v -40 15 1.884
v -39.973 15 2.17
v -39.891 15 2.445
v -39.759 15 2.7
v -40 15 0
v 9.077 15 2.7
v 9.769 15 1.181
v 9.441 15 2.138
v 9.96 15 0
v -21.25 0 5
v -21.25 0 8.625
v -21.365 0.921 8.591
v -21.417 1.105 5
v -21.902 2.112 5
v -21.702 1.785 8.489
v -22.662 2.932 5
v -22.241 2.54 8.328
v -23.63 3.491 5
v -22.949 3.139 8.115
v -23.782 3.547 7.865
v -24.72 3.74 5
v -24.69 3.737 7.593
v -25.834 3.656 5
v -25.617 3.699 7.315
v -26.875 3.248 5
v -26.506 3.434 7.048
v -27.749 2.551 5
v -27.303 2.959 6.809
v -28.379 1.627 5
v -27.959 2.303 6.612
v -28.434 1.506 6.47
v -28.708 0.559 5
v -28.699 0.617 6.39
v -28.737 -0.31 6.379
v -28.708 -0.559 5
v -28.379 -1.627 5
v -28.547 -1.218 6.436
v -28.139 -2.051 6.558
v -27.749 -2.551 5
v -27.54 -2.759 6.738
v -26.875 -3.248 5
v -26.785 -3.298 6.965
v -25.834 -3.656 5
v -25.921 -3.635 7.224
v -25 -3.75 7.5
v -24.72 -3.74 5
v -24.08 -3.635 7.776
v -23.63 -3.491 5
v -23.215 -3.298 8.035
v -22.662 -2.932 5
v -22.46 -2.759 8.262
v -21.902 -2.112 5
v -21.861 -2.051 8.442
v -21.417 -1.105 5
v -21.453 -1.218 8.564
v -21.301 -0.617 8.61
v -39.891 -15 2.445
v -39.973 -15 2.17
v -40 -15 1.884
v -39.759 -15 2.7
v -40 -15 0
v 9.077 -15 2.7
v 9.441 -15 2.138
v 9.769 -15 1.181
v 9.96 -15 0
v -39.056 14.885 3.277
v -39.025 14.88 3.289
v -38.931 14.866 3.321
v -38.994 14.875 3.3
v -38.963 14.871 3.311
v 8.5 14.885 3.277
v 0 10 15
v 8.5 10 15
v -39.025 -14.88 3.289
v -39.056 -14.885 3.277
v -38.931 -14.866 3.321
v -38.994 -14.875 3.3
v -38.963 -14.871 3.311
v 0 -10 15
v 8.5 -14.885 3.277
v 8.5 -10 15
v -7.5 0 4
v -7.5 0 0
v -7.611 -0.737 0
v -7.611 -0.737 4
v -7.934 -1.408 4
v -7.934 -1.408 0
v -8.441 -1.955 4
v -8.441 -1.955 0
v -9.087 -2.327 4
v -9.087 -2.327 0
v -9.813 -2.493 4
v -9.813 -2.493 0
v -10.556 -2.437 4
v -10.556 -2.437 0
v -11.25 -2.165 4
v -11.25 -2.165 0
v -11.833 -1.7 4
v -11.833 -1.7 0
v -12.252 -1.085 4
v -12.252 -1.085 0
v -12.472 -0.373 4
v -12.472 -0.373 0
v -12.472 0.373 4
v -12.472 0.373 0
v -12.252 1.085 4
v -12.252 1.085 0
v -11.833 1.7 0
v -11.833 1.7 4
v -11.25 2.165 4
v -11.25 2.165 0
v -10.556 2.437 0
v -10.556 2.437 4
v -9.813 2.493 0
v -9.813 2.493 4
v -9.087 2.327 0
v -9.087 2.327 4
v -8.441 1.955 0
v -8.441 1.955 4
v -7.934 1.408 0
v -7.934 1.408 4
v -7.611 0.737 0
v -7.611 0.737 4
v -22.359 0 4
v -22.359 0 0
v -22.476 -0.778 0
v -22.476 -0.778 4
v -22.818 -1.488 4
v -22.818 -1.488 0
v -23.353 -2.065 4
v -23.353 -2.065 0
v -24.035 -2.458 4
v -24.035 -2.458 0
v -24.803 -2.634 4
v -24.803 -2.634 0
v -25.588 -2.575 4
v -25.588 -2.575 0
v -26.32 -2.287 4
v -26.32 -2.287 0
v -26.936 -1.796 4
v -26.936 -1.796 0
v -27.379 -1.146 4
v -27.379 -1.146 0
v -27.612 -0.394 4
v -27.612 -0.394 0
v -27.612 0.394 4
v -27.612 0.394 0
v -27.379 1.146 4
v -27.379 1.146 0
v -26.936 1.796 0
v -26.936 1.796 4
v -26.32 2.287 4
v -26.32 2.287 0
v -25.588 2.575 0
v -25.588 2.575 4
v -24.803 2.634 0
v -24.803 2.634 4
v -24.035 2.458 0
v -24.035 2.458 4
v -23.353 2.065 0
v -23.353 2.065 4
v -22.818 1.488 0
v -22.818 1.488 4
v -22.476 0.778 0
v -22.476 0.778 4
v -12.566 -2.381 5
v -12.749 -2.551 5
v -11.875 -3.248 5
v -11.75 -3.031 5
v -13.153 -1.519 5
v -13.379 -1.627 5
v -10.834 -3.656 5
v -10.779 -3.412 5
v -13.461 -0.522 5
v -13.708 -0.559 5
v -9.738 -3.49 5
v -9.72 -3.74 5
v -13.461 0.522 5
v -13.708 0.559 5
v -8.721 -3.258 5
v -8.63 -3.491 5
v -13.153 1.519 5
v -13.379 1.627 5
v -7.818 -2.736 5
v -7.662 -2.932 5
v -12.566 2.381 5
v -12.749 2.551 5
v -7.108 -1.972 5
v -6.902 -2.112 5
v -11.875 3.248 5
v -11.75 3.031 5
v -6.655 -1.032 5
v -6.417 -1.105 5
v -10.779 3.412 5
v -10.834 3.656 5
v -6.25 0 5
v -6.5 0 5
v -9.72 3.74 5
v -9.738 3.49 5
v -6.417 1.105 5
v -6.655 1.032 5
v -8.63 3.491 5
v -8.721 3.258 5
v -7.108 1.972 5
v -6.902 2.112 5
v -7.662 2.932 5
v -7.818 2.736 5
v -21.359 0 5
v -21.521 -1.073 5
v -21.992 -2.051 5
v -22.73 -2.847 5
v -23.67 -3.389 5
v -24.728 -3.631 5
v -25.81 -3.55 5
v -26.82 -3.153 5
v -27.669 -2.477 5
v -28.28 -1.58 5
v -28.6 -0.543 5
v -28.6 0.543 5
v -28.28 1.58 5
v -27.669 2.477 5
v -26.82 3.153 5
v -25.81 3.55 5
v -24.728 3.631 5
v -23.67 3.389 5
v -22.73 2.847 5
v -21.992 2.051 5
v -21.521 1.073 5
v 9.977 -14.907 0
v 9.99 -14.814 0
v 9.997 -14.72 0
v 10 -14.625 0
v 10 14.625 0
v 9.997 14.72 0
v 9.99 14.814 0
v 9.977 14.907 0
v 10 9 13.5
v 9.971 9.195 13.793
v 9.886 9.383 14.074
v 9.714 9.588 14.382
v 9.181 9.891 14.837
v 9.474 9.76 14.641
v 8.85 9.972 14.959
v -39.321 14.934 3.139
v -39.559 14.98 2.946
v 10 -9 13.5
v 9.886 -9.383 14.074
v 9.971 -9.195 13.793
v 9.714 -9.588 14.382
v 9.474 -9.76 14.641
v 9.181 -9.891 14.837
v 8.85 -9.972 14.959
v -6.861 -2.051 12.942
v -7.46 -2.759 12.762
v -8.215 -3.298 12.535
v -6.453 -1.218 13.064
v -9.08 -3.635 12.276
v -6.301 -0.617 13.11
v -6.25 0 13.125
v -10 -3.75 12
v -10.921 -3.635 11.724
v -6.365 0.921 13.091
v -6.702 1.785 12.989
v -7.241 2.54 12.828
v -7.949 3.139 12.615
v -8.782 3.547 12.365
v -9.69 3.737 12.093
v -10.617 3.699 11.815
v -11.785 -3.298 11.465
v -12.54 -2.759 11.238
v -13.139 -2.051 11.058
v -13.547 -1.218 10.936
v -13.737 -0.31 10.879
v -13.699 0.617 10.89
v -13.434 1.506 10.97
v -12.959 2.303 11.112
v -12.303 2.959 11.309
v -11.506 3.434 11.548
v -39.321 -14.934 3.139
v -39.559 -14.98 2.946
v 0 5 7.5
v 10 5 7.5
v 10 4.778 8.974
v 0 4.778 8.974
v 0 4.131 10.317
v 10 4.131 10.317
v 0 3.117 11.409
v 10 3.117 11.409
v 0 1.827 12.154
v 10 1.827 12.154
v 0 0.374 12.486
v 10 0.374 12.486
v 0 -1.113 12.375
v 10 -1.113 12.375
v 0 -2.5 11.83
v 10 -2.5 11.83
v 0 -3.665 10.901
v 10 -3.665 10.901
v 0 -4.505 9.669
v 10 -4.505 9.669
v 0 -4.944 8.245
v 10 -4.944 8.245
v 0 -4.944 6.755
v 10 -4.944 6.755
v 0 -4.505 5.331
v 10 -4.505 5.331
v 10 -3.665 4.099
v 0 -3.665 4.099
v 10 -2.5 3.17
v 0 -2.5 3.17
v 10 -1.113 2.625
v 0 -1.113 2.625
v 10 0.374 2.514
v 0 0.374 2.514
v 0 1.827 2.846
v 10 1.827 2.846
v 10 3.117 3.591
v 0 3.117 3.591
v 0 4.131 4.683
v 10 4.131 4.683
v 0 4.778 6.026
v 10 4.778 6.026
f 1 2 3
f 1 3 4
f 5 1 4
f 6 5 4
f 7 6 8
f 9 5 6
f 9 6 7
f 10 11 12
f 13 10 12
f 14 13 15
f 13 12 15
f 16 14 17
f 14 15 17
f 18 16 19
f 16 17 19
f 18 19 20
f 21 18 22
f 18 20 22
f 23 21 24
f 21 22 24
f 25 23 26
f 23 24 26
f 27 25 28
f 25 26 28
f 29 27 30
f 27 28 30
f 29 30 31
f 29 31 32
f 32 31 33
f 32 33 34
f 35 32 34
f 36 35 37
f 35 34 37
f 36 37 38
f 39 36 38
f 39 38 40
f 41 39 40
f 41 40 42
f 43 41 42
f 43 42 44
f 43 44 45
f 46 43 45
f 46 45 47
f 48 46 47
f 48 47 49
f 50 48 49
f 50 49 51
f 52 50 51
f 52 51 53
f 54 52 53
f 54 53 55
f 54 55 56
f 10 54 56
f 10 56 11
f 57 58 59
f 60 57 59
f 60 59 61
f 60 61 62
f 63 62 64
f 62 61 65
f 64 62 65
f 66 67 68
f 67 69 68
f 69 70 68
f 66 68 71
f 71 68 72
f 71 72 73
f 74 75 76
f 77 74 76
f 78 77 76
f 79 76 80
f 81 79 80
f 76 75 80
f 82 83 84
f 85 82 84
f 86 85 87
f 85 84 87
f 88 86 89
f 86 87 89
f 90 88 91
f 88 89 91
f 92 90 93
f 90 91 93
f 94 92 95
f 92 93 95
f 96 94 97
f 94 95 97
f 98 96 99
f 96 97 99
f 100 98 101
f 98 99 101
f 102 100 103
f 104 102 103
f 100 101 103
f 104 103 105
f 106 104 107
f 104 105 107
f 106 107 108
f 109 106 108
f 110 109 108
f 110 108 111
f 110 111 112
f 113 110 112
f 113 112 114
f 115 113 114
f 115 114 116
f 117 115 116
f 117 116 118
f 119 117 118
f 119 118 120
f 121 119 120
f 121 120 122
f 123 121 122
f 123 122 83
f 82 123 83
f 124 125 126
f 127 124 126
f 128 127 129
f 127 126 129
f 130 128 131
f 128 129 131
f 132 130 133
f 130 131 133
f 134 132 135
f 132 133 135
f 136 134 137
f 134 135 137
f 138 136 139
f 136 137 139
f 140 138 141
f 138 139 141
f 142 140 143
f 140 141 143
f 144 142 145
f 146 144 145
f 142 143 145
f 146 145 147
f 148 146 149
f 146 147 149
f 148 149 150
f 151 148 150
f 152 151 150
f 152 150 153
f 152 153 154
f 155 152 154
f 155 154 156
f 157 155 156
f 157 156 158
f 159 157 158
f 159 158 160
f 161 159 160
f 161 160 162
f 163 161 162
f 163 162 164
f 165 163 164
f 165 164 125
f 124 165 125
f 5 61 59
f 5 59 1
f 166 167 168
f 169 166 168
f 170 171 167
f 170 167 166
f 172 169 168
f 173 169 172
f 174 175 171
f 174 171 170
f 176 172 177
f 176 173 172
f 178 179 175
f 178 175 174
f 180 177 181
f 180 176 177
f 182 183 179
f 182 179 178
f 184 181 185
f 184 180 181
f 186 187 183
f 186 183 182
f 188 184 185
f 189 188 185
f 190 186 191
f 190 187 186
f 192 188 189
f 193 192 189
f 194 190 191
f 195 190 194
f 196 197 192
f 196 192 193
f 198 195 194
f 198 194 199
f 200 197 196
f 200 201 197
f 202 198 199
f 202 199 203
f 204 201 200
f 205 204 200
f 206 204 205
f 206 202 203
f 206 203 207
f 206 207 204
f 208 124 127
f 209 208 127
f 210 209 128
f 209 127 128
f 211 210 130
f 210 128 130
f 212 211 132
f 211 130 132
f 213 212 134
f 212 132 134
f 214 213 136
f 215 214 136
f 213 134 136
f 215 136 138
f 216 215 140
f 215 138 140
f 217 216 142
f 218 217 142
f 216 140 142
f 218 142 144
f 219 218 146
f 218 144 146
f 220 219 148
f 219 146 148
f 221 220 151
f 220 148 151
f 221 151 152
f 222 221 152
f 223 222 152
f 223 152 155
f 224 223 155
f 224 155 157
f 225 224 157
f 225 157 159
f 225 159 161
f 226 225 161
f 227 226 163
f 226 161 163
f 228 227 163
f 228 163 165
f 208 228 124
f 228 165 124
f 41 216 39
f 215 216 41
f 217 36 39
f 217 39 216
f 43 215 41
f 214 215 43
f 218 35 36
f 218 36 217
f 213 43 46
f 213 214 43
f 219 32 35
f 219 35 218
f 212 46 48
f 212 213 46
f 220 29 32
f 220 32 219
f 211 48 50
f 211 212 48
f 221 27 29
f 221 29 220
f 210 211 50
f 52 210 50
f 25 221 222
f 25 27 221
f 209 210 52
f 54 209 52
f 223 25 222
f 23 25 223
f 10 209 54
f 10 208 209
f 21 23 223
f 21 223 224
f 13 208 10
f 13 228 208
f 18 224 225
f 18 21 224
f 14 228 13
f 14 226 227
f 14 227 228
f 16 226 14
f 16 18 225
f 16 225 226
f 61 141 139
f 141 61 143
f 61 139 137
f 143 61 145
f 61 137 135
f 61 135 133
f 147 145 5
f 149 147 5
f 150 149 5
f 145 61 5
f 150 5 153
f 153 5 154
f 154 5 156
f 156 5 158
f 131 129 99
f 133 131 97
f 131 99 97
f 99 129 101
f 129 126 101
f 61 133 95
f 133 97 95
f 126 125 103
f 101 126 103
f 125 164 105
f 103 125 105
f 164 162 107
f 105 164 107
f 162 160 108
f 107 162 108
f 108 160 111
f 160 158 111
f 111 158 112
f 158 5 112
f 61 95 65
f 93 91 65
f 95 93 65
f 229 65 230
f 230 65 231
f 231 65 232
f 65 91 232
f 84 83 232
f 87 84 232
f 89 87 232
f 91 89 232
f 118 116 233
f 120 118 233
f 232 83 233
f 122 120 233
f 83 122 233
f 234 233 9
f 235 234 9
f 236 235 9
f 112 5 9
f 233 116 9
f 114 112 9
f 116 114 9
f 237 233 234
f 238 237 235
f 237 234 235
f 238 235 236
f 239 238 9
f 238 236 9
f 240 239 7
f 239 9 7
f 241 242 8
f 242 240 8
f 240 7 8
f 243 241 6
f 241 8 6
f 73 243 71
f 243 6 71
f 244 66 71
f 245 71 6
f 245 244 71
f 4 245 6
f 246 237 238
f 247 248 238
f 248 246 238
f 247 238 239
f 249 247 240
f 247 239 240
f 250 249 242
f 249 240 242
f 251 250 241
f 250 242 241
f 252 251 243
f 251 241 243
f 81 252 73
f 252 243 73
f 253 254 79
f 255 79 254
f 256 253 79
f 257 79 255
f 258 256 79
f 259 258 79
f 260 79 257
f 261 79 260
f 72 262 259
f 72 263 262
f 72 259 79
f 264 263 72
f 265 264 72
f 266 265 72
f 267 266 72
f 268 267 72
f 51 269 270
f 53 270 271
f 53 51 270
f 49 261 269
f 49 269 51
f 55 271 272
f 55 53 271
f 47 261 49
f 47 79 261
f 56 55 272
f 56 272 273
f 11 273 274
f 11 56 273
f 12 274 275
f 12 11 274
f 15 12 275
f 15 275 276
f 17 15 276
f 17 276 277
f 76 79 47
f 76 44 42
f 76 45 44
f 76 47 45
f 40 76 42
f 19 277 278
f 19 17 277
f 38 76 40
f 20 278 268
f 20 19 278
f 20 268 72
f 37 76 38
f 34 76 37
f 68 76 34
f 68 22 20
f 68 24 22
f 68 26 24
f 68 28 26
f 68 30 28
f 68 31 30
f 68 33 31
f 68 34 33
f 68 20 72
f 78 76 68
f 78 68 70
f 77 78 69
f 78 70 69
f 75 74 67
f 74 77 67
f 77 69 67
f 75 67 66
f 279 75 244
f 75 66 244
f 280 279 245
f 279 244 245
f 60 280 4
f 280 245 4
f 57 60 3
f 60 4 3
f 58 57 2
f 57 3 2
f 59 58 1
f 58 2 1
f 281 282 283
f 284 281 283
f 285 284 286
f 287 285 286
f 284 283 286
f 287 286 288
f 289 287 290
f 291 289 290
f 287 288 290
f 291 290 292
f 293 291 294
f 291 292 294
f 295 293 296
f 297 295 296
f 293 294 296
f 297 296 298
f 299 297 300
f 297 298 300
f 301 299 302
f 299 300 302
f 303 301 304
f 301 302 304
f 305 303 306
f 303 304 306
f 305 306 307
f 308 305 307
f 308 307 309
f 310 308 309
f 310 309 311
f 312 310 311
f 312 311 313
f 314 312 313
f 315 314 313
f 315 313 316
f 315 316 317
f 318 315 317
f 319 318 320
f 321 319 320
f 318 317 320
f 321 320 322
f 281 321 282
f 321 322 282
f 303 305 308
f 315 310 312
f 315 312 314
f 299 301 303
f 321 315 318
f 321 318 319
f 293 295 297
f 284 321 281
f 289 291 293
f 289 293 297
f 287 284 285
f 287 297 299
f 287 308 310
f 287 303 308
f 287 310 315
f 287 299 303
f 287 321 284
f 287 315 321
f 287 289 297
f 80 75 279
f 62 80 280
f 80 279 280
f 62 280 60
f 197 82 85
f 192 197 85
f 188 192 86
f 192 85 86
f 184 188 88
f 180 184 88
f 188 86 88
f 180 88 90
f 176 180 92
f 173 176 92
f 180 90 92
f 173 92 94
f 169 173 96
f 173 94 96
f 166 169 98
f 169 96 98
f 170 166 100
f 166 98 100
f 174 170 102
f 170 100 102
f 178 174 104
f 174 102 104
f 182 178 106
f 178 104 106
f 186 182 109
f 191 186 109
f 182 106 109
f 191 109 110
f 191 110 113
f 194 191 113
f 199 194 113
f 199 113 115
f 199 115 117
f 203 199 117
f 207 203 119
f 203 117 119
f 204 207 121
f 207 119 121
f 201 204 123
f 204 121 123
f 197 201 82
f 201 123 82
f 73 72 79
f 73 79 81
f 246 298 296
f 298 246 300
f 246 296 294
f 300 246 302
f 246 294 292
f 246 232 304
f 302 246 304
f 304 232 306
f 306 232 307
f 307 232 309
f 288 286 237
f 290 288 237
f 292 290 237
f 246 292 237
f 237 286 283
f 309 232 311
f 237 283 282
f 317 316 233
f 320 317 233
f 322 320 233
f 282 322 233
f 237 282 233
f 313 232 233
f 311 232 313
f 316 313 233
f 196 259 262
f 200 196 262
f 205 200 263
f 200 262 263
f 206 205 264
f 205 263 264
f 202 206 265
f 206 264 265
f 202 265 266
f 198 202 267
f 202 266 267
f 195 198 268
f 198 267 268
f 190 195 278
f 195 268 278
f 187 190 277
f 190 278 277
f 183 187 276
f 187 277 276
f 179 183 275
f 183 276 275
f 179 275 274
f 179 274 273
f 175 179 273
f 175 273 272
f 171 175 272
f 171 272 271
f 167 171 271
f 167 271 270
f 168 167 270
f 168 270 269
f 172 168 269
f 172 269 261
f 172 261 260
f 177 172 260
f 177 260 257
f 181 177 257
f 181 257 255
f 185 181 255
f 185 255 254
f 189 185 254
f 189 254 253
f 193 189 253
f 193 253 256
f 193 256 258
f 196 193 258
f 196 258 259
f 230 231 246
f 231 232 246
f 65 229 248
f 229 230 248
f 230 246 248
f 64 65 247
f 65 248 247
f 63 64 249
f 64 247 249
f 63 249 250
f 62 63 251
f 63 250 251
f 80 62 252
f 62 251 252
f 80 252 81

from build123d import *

# Parameters (mm, degrees)
F0_W        = 50
F0_H        = 30
F1_DEPTH    = 15
F2_SIZE2    = 12
F2_SIZE     = 40
F3_C1_SIZE2 = 5
F3_C1_SIZE  = 12
F3_C2_SIZE2 = 12
F3_C2_SIZE  = 5
F5_T1_DEPTH = 35.5802298817
F5_T3_DEPTH = 52.025
F5_T5_DEPTH = 27.5
F5_T7_DEPTH = 20.5
F5_T9_DEPTH = 20.5
F6_R        = 5
F7_DEPTH    = 10
F8_R        = 2.5
F8_R_2      = 2.6409986757
F9_DEPTH    = 40
F10_R       = 3.75
F11_DEPTH   = 10
F12_SIZE    = 1


# Not quite as in the source:
# - a fillet or chamfer that OpenCascade refuses, or shapes differently, is made with other operations: its cross-section is extruded or revolved along the edge and cut away or added
# - two fillets or chamfers of one size are made in one step


with BuildPart() as f1:
    # F0 (on Top) → F1 (new body)
    with BuildSketch(Plane.XY):
        with Locations((-15, 0)):
            Rectangle(F0_W, F0_H)
    extrude(amount=F1_DEPTH)

    # F2
    f2_edges = [f1.edges().sort_by_distance(p)[0] for p in [
        (-40, 0, 15),
    ]]
    f2_side = f1.faces().sort_by_distance((-15, 0, 15))[0]
    chamfer(f2_edges, length=F2_SIZE, length2=F2_SIZE2, reference=f2_side)

    # F3: chamfer of 12 x 5 on 2 edges, made by hand

    # F3_c1
    f3_c1_edges = [f1.edges().sort_by_distance(p)[0] for p in [
        (5, 15, 15),
    ]]
    f3_c1_side = f1.faces().sort_by_distance((5, 15, 14.9))[0]
    chamfer(f3_c1_edges, length=F3_C1_SIZE, length2=F3_C1_SIZE2, reference=f3_c1_side)

    # F3_c2
    f3_c2_edges = [f1.edges().sort_by_distance(p)[0] for p in [
        (5, -15, 15),
    ]]
    f3_c2_side = f1.faces().sort_by_distance((5, -14.9, 15))[0]
    chamfer(f3_c2_edges, length=F3_C2_SIZE, length2=F3_C2_SIZE2, reference=f3_c2_side)

    # F5: fillet of radius 1.5 on 6 edges, made by hand

    # F5_s2 → F5_t1 (cut)
    with BuildSketch(Plane.XZ.offset(-17.7901149408)):
        with BuildLine():
            ThreePointArc((-38.9310218283, 3.3206934515), (-39.7034393924, 2.7793498181), (-40, 1.8839540237))
            Line((-40, 1.8839540237), (-40, 3))
            Line((-40, 3), (-38.9310218283, 3.3206934515))
        make_face()
    extrude(amount=F5_T1_DEPTH, mode=Mode.SUBTRACT)

    # F5_s4 → F5_t3 (cut)
    with BuildSketch(Plane.YZ.offset(-41.275)):
        with BuildLine():
            ThreePointArc((14.8846153846, 3.2769230769), (14.9708710135, 2.9941742027), (15, 2.7))
            Line((15, 2.7), (15, 3))
            Line((15, 3), (14.8846153846, 3.2769230769))
        make_face()
        with BuildLine():
            ThreePointArc((-14.8846153846, 3.2769230769), (-14.9708710135, 2.9941742027), (-15, 2.7))
            Line((-15, 2.7), (-15, 3))
            Line((-15, 3), (-14.8846153846, 3.2769230769))
        make_face()
    extrude(amount=F5_T3_DEPTH, mode=Mode.SUBTRACT)

    # F5_s6 → F5_t5 (cut)
    with BuildSketch(Plane.XZ.offset(-13.75)):
        with BuildLine():
            ThreePointArc((10, 13.5), (9.5606601718, 14.5606601718), (8.5, 15))
            Line((8.5, 15), (10, 15))
            Line((10, 15), (10, 13.5))
        make_face()
    extrude(amount=F5_T5_DEPTH, mode=Mode.SUBTRACT)

    # F5_s8 → F5_t7 (cut)
    with BuildSketch(Plane(origin=(0, 2.5961538462, -6.2307692308), x_dir=(1, 0, 0), z_dir=(0, -0.3846153846, 0.9230769231))):
        with BuildLine():
            ThreePointArc((10, 13.5), (9.5606601718, 14.5606601718), (8.5, 15))
            Line((8.5, 15), (10, 15))
            Line((10, 15), (10, 13.5))
        make_face()
    extrude(amount=F5_T7_DEPTH, mode=Mode.SUBTRACT)

    # F5_s10 → F5_t9 (cut)
    with BuildSketch(Plane(origin=(0, 5.2884615385, 12.6923076923), x_dir=(1, 0, 0), z_dir=(0, -0.3846153846, -0.9230769231))):
        with BuildLine():
            ThreePointArc((10, 13.5), (9.5606601718, 14.5606601718), (8.5, 15))
            Line((8.5, 15), (10, 15))
            Line((10, 15), (10, 13.5))
        make_face()
    extrude(amount=F5_T9_DEPTH, mode=Mode.SUBTRACT)

    # F6 (on face) → F7 (cut)
    with BuildSketch(Plane.YZ.offset(10)):
        with Locations((0, 7.5)):
            Circle(F6_R)
    extrude(amount=-F7_DEPTH, mode=Mode.SUBTRACT)

    # F8 (on face) → F9 (cut)
    with BuildSketch(Plane(origin=(0, 0, 0), x_dir=(1, 0, 0), z_dir=(0, 0, -1))):
        with Locations((-10, 0)):
            Circle(F8_R)
        with Locations((-25, 0)):
            Circle(F8_R_2)
    extrude(amount=-F9_DEPTH, mode=Mode.SUBTRACT)

    # F10 (on face) → F11 (cut)
    with BuildSketch(Plane.XY.offset(15)):
        with Locations((-10, 0)):
            Circle(F10_R)
        with Locations((-25, 0)):
            Circle(F10_R)
    extrude(amount=-F11_DEPTH, mode=Mode.SUBTRACT)

    # F12
    f12_edges = [f1.edges().sort_by_distance(p)[0] for p in [
        (-27.640999, 0, 5),
        (-12.5, 0, 5),
    ]]
    chamfer(f12_edges, length=F12_SIZE)


solid = f1.part
